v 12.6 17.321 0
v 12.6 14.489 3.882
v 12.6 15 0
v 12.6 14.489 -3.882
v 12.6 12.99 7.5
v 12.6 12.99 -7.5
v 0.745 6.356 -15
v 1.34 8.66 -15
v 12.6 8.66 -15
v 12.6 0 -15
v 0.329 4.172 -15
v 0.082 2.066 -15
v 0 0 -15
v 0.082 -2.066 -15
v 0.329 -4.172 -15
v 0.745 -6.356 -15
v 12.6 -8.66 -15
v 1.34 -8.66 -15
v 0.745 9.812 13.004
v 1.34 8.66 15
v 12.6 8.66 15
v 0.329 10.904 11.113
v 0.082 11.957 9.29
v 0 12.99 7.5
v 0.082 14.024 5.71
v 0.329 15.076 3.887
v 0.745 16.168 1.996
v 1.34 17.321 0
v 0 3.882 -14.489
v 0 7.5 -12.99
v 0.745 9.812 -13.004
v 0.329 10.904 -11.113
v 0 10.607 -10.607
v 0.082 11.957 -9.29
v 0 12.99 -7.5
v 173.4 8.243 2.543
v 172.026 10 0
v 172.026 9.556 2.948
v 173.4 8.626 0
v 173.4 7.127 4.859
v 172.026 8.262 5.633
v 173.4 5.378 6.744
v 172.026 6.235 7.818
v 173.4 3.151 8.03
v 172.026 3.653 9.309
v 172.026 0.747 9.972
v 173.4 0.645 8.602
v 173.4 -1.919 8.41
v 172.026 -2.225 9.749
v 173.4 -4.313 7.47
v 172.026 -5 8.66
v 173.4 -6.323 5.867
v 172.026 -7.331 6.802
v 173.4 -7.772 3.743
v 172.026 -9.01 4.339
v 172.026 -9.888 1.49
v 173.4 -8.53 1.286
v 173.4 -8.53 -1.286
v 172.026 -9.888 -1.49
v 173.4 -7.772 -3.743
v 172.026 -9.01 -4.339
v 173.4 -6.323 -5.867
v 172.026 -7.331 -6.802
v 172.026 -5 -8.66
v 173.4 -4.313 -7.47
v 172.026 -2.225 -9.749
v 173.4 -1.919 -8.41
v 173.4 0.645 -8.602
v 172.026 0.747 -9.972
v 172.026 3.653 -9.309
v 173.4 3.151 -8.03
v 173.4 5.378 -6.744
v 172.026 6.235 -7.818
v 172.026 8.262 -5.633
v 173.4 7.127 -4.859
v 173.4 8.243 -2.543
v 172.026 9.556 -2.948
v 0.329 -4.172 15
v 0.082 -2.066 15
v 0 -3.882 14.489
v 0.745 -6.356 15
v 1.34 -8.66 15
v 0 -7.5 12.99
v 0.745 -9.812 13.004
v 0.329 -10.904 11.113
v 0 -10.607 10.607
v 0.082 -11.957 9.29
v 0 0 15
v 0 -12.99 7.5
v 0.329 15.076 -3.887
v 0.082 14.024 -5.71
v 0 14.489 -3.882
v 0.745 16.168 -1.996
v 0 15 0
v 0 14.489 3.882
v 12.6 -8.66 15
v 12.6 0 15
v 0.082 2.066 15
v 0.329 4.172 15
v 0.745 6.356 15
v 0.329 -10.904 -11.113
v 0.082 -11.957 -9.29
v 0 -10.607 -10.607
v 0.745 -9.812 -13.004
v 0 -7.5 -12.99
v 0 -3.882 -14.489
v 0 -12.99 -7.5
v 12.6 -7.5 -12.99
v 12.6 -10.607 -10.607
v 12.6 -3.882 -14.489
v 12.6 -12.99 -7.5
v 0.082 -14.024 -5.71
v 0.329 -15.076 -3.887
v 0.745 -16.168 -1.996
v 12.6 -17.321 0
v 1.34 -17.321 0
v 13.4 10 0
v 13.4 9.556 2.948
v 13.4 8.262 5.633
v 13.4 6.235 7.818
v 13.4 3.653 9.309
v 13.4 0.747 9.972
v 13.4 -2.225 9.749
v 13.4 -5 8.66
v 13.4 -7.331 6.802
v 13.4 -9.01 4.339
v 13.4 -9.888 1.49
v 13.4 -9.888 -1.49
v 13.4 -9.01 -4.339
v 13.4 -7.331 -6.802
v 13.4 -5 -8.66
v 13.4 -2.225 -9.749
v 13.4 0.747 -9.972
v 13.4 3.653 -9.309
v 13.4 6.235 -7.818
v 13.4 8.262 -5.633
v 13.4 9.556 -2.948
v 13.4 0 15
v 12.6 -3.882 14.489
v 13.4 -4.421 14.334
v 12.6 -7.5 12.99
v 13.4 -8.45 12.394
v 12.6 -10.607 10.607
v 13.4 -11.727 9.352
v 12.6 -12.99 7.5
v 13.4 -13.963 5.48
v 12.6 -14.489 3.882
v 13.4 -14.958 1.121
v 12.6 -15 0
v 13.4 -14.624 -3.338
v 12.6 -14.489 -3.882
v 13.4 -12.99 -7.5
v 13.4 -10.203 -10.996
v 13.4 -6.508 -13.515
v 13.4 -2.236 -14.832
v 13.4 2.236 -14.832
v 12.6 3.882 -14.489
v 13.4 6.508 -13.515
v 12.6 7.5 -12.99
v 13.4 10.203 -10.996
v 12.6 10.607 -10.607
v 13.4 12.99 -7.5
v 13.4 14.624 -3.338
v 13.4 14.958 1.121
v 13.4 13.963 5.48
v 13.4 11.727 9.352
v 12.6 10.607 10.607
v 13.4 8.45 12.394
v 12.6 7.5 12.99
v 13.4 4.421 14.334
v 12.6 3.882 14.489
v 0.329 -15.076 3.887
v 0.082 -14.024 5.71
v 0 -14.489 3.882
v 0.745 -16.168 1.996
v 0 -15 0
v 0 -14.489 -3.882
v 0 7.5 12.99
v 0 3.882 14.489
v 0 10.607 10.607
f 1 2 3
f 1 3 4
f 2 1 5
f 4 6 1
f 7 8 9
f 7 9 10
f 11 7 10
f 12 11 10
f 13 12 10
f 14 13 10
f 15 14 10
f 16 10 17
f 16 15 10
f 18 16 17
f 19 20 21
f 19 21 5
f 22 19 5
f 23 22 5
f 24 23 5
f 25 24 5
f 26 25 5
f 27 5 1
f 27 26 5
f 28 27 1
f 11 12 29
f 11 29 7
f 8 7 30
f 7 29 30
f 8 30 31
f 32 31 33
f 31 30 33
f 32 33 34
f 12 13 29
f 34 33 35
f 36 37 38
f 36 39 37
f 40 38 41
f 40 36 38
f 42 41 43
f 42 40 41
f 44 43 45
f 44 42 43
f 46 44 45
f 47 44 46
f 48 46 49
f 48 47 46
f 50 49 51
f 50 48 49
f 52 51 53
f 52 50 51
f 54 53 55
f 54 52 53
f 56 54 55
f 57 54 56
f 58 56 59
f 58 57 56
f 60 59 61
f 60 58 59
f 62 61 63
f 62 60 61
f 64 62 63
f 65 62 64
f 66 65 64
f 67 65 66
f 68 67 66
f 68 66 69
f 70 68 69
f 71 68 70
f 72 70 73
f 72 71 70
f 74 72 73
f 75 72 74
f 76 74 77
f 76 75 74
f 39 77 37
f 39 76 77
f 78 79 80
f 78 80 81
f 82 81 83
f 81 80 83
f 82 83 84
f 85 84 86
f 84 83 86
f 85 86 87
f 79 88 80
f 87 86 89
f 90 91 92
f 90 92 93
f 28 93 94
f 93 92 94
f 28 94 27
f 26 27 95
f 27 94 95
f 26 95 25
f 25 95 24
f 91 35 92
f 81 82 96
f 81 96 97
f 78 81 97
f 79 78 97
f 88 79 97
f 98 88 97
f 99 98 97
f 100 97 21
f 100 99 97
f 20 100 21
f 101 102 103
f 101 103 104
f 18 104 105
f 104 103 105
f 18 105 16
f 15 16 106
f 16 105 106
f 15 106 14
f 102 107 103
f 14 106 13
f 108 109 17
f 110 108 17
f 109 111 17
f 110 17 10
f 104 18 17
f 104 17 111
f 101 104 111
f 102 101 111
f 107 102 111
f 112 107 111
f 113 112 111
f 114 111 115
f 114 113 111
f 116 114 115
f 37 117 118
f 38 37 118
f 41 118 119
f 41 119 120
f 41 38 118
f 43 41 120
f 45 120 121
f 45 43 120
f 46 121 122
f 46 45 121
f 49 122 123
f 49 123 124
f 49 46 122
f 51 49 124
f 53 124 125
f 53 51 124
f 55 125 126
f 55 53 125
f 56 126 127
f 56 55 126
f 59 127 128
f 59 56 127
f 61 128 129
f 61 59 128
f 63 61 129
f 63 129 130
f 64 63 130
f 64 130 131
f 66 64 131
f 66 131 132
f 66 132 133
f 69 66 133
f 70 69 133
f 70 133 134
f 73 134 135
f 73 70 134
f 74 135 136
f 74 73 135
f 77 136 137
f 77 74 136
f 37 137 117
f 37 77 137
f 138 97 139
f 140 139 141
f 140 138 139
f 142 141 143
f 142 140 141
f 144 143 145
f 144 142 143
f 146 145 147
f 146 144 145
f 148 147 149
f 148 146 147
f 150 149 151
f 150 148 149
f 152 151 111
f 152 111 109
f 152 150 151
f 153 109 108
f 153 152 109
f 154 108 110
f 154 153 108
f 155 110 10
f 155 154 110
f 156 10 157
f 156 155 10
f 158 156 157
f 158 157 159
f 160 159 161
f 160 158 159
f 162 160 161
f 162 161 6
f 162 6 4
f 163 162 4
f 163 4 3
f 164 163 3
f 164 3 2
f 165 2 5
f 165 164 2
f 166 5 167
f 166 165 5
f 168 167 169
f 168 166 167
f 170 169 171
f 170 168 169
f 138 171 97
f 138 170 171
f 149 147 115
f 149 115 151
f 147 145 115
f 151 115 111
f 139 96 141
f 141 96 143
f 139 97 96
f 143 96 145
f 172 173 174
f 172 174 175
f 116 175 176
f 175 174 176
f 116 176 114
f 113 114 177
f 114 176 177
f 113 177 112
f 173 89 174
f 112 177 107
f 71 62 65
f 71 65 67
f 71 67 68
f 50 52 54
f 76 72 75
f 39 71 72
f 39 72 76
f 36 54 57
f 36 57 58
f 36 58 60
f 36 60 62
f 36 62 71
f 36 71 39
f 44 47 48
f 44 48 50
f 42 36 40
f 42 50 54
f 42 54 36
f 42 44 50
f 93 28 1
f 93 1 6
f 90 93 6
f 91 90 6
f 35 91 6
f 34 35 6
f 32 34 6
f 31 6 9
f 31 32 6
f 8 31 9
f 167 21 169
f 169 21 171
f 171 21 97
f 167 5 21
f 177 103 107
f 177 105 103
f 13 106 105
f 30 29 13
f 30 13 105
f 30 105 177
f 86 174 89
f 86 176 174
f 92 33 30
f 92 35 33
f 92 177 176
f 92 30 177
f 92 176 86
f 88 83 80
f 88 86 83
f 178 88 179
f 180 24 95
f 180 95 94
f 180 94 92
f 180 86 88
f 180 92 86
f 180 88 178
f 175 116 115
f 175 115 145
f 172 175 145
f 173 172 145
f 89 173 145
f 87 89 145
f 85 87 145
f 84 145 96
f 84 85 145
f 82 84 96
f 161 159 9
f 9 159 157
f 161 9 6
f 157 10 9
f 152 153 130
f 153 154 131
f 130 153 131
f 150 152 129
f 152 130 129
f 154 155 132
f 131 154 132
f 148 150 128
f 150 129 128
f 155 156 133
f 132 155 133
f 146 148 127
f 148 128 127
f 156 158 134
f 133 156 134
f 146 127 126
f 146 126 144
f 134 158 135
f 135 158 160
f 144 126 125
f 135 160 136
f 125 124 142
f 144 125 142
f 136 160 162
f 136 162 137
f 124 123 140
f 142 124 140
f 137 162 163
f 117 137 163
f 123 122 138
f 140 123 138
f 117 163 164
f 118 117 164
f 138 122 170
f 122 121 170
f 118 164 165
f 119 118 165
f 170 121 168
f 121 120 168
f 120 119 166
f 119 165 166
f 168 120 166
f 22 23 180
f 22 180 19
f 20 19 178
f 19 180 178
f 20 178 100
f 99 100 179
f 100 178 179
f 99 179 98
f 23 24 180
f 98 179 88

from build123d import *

# Parameters (mm, degrees)
BASEHEAD_DEPTH = 13.4
SKETCH4_W      = 0.8
SKETCH4_H      = 12.320508076


# Read off the part's stored shape, not the designer's step: HeadChamfer
with BuildPart() as part:
    # Sketch1 → BaseHead (new body)
    with BuildSketch(Plane(origin=(0, 0, 0), x_dir=(0, 0, -1), z_dir=(1, 0, 0))):
        Polygon((15, 8.660254038), (15, -8.660254038), (0, -17.320508076), (-15, -8.660254038), (-15, 8.660254038), (0, 17.320508076), align=None)
    extrude(amount=BASEHEAD_DEPTH)

    # HeadChamfer outline → HeadChamfer (revolve, cut)
    with BuildSketch(Plane.YX):
        Polygon((17.320508077, 1.339745963), (14.99999979, -1.21e-07), (17.320508077, -1.21e-07), align=None)
    revolve(axis=Axis((0, 0, 0), (1, 0, 0)), mode=Mode.SUBTRACT)

    # HeadChamfer 2 outline → HeadChamfer 2 (revolve)
    with BuildSketch(Plane.YX):
        Polygon((10, 13.4), (10, 172.026), (8.626, 173.4), (0, 173.4), (0, 13.4), align=None)
    revolve(axis=Axis((0, 0, 0), (1, 0, 0)))

    # Sketch4 → BearingFace (revolve, cut)
    with BuildSketch(Plane.XY, mode=Mode.PRIVATE) as bearingface_sk:
        with Locations((13, 21.160254038)):
            Rectangle(SKETCH4_W, SKETCH4_H)
    revolve(bearingface_sk.sketch.rotate(Axis((0, 0, 0), (1, 0, 0)), 90), axis=Axis((0, 0, 0), (1, 0, 0)), mode=Mode.SUBTRACT)


solid = part.part
